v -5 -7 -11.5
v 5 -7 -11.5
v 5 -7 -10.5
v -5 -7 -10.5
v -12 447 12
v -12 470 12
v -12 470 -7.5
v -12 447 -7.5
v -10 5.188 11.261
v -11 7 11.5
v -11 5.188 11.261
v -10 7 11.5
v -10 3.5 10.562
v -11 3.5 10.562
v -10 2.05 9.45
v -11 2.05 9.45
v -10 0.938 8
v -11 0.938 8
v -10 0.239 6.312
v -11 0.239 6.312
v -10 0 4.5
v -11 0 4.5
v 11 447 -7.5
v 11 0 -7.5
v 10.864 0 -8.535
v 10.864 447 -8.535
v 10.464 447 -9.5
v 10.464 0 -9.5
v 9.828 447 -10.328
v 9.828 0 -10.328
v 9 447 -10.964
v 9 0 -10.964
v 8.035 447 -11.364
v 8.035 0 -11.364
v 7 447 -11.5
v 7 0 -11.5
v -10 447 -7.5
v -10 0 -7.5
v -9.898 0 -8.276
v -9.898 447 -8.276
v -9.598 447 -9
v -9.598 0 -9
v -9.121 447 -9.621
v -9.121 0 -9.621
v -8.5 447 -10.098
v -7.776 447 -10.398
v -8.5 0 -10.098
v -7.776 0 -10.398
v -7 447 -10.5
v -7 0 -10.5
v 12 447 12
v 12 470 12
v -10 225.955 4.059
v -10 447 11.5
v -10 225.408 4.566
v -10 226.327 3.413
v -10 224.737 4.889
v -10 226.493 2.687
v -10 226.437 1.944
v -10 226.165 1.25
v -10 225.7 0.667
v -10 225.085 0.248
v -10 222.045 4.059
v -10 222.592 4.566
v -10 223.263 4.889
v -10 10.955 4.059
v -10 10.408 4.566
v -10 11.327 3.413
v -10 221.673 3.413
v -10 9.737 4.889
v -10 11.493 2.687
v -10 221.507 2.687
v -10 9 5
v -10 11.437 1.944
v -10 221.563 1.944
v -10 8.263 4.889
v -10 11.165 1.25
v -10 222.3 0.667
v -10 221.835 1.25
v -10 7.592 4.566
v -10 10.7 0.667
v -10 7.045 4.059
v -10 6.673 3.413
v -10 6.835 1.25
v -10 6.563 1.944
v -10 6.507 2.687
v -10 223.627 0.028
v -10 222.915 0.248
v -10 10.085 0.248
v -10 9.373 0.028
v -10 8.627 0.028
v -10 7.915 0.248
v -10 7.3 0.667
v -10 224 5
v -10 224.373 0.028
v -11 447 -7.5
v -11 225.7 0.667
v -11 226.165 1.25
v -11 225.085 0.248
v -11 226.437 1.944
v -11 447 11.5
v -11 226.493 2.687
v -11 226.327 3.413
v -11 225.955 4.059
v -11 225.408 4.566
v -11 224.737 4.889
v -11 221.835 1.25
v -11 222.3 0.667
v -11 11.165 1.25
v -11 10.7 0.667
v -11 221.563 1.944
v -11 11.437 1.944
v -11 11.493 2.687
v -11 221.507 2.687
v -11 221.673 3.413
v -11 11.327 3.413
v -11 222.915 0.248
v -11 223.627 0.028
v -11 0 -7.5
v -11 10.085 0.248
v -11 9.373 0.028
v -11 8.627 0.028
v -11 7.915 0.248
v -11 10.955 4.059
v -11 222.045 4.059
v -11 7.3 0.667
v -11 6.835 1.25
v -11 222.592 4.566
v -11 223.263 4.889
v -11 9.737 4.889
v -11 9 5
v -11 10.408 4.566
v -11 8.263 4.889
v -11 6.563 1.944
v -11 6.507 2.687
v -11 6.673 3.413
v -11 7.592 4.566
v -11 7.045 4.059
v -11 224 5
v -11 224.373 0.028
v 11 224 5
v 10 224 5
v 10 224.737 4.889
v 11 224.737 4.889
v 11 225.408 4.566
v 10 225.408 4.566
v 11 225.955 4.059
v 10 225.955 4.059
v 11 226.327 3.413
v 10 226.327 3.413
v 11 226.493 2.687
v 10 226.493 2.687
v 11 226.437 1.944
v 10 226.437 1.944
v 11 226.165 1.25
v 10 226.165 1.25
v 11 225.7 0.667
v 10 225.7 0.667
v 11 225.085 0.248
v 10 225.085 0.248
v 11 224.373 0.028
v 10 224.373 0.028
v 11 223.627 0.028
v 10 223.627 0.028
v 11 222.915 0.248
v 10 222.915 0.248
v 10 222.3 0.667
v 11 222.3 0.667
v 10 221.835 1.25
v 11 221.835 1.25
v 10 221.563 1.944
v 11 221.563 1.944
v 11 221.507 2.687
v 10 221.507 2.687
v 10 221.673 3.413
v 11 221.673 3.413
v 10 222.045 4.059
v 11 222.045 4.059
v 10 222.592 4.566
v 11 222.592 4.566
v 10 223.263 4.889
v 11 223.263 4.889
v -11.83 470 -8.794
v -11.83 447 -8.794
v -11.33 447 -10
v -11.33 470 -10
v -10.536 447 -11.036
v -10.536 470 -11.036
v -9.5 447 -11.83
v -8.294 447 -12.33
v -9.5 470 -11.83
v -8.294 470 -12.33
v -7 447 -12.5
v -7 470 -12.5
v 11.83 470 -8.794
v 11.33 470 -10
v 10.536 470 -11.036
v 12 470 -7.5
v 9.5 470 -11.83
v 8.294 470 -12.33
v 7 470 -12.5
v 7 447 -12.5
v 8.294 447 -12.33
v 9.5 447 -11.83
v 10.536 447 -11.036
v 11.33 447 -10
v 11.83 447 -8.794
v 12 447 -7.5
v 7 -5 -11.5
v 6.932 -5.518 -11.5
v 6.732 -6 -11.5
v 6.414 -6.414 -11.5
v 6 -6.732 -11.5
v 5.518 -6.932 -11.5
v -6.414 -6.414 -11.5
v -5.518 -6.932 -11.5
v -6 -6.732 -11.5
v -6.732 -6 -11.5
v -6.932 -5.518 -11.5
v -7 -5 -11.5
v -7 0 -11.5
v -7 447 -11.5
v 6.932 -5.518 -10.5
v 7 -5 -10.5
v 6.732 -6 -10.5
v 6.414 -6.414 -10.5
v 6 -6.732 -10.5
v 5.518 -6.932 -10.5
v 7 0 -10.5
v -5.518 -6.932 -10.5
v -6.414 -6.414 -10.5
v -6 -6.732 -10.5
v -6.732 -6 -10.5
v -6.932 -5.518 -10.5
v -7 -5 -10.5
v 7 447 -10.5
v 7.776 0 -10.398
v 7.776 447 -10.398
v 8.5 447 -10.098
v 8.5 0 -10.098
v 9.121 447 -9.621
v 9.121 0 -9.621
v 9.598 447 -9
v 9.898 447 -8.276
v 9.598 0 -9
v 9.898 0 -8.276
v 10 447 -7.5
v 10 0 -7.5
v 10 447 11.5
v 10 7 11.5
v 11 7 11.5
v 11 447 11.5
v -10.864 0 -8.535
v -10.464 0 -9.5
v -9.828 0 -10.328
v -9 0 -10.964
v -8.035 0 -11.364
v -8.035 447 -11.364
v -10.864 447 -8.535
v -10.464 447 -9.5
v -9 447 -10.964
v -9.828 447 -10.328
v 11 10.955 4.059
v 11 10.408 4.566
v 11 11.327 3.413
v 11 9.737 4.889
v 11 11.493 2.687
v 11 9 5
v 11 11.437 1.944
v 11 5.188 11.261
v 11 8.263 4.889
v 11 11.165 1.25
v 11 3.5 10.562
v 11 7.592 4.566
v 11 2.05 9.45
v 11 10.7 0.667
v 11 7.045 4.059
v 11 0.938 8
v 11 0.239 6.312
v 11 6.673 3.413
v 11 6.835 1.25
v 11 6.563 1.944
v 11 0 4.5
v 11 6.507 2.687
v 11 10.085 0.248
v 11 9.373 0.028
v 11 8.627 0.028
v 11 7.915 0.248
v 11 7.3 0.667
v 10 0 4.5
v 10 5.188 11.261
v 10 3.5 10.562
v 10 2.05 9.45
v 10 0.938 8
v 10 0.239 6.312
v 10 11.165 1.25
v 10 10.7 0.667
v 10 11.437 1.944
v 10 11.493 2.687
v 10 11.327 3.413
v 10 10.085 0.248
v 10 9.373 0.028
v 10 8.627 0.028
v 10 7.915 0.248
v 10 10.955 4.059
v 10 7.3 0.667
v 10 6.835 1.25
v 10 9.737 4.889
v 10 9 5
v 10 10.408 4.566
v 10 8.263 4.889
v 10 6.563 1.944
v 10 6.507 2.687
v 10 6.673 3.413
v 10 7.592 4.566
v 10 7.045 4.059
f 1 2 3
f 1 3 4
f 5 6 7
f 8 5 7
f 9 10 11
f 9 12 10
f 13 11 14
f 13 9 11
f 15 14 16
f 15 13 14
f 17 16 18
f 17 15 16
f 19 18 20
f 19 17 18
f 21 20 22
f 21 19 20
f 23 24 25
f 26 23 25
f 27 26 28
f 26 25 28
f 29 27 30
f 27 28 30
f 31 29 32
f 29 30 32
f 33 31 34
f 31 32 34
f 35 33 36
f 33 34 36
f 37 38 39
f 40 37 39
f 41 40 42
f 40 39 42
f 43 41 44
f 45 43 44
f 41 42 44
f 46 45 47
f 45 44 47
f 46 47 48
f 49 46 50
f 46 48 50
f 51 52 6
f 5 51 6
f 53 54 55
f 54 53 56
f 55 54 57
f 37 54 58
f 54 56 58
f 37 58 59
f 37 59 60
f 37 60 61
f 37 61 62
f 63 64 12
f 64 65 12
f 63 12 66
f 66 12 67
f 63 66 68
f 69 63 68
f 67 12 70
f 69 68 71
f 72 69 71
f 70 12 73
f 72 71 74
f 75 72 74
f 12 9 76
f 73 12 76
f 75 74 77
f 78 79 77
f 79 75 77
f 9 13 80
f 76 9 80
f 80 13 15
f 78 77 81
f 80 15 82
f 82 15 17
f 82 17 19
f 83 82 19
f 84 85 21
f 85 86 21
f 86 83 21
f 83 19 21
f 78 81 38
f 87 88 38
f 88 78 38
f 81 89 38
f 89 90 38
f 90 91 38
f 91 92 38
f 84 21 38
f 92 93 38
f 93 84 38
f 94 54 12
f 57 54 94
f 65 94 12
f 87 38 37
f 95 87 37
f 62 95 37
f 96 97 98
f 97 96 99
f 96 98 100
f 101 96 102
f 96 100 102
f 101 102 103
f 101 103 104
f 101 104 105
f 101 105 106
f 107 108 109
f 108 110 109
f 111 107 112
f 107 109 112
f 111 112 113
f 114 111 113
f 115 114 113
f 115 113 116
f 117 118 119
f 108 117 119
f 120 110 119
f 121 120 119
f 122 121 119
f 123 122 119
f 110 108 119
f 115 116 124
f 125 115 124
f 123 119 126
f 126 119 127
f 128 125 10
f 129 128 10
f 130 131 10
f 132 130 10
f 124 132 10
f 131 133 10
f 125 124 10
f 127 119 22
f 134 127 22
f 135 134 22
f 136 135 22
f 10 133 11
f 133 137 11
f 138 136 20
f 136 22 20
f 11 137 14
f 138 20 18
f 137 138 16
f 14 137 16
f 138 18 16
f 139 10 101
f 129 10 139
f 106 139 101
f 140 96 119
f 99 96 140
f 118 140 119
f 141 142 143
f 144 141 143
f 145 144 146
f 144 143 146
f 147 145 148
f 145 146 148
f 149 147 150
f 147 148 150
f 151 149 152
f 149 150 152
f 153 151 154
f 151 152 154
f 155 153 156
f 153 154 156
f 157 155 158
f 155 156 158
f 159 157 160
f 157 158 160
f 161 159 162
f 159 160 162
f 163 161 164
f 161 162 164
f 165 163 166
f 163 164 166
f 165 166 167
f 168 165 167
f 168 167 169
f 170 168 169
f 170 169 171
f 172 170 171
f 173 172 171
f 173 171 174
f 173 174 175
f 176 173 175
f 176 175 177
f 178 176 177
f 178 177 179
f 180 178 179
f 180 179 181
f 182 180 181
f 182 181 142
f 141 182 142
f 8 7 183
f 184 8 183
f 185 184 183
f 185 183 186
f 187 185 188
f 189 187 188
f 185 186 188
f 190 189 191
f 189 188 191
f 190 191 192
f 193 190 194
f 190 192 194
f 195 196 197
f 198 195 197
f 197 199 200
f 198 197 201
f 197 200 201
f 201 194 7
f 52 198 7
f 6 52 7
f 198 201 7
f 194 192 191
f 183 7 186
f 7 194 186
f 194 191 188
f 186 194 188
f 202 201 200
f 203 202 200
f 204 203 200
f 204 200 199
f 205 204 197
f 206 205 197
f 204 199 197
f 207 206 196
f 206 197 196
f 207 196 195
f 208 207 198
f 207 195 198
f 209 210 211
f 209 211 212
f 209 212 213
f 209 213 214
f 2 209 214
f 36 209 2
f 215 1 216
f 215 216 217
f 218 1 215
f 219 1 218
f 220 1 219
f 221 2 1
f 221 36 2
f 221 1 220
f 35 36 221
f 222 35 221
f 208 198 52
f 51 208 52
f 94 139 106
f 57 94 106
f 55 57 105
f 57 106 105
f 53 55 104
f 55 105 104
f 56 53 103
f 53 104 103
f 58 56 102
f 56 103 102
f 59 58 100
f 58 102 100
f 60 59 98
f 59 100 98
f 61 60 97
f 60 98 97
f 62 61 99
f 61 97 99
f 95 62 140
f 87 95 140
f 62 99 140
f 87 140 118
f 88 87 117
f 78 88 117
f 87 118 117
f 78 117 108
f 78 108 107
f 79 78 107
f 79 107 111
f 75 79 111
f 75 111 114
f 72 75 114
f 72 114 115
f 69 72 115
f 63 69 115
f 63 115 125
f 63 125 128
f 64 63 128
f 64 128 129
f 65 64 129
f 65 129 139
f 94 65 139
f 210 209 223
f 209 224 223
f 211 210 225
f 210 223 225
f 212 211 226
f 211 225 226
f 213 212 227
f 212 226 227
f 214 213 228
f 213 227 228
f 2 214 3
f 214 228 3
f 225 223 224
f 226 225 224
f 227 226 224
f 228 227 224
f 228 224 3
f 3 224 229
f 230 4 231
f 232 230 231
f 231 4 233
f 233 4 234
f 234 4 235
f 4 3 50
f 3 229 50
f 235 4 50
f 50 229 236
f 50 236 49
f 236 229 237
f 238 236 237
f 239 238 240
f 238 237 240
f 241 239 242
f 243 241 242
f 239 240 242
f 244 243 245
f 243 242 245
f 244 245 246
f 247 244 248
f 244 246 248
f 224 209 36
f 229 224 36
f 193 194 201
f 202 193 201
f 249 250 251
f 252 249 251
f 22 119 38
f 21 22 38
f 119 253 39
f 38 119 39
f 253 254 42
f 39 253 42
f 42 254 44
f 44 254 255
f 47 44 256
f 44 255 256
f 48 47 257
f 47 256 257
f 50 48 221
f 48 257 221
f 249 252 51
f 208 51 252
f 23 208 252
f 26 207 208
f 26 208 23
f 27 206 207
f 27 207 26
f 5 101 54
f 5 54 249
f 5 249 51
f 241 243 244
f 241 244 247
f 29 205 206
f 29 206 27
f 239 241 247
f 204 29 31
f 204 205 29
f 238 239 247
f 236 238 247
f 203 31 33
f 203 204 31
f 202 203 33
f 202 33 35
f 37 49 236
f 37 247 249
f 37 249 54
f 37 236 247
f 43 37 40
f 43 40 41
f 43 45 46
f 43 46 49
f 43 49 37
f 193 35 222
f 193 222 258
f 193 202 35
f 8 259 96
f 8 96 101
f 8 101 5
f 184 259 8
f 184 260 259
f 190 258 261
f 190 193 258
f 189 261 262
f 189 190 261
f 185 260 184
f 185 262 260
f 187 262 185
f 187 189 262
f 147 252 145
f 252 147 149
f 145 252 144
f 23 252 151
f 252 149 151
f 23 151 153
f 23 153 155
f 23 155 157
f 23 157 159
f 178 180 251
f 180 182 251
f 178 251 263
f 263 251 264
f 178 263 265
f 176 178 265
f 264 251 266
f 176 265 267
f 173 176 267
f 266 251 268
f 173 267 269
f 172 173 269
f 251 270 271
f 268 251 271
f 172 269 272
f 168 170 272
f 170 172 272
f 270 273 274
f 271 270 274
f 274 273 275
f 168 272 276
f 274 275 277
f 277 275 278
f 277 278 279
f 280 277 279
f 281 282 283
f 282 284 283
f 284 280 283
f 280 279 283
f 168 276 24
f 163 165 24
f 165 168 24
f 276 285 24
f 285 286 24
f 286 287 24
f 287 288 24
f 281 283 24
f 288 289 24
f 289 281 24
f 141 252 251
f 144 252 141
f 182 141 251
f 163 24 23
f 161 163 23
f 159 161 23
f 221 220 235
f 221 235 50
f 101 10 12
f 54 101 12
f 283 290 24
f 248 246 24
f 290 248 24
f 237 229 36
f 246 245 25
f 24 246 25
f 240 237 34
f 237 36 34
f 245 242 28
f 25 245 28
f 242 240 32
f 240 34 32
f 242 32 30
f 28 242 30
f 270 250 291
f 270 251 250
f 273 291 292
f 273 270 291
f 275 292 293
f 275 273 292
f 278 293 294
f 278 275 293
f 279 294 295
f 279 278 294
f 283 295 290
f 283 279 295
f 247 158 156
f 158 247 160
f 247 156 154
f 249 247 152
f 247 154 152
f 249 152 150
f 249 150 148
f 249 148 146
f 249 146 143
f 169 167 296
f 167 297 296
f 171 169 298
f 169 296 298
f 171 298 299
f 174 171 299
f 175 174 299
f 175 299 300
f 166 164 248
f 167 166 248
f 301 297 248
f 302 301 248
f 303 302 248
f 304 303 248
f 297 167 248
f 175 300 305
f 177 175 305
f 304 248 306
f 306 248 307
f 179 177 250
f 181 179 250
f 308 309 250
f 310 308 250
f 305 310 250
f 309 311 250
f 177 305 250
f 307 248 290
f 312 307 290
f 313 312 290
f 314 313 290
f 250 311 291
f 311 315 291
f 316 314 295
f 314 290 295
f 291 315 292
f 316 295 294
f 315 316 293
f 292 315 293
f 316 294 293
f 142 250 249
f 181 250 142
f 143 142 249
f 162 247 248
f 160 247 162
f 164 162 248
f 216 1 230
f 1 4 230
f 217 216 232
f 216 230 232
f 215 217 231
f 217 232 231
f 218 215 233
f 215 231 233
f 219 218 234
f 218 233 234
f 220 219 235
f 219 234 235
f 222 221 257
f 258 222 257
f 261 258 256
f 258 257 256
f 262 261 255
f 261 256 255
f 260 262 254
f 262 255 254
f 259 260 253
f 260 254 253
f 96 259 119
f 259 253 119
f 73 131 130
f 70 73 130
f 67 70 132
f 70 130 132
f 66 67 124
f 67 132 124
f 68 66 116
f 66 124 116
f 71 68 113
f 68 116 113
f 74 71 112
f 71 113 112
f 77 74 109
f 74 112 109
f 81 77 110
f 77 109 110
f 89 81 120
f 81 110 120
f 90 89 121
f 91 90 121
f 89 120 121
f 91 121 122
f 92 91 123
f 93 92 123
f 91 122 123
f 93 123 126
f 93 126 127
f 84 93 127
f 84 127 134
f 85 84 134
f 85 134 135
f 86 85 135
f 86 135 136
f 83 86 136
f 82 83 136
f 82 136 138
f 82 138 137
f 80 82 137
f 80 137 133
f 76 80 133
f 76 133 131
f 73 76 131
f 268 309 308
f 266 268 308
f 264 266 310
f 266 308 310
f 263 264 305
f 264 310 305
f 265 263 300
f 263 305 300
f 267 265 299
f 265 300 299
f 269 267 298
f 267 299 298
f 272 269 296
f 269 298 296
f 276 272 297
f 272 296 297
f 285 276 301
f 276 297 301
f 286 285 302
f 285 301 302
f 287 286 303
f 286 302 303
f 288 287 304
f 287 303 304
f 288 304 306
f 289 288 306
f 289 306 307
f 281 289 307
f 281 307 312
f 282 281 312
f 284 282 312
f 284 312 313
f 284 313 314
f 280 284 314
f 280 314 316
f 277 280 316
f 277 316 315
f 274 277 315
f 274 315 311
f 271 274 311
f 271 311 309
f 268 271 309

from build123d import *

# Parameters (mm, degrees)
EXTRUDE_1_DEPTH     = 470
FILLET_1_R          = 7
EXTRUDE_1_2_DEPTH   = 23
SKETCH_5_W          = 14
SKETCH_5_H          = 7
EXTRUDE_2_DEPTH     = 1
FILLET_2_R          = 2
SKETCH_3_R          = 2.5
CUT_EXTRUDE_1_DEPTH = 471.728424891


with BuildPart() as part:
    # Эскиз1 → Extrude 1 (new body)
    with BuildSketch(Plane(origin=(0, 0, 0), x_dir=(1, 0, 0), z_dir=(0, 1, 0))):
        with BuildLine():
            Line((11, -11.5), (11, 7.5))
            ThreePointArc((11, 7.5), (9.828427125, 10.328427125), (7, 11.5))
            Line((7, 11.5), (-7, 11.5))
            ThreePointArc((-7, 11.5), (-9.828427125, 10.328427125), (-11, 7.5))
            Line((-11, 7.5), (-11, -11.5))
            Line((-11, -11.5), (-10, -11.5))
            Line((-10, -11.5), (-10, 7.5))
            ThreePointArc((-10, 7.5), (-9.121320344, 9.621320344), (-7, 10.5))
            Line((-7, 10.5), (7, 10.5))
            ThreePointArc((7, 10.5), (9.121320344, 9.621320344), (10, 7.5))
            Line((10, 7.5), (10, -11.5))
            Line((10, -11.5), (11, -11.5))
        make_face()
    extrude(amount=EXTRUDE_1_DEPTH)

    # Скругление1
    fillet_1_edges = [part.edges().sort_by_distance(p)[0] for p in [
        (-10.5, 0, 11.5),
        (10.5, 0, 11.5),
    ]]
    fillet(fillet_1_edges, radius=FILLET_1_R)

    # Эскиз2 → Extrude 1 2 (add)
    with BuildSketch(Plane(origin=(0, 470, 0), x_dir=(1, 0, 0), z_dir=(0, 1, 0))):
        with BuildLine():
            Line((-12, -11.5), (-12, 7.5))
            ThreePointArc((-12, 7.5), (-10.535533906, 11.035533906), (-7, 12.5))
            Line((-7, 12.5), (7, 12.5))
            ThreePointArc((7, 12.5), (10.535533906, 11.035533906), (12, 7.5))
            Line((12, 7.5), (12, -11.5))
            Line((12, -11.5), (12, -12))
            Line((12, -12), (-12, -12))
            Line((-12, -12), (-12, -11.5))
        make_face()
    extrude(amount=-EXTRUDE_1_2_DEPTH)

    # Эскиз5 → Бобышка-Вытянуть2 (add)
    with BuildSketch(Plane(origin=(0, 0, -11.5), x_dir=(-1, 0, 0), z_dir=(0, 0, -1))):
        with Locations((0, -3.5)):
            Rectangle(SKETCH_5_W, SKETCH_5_H)
    extrude(amount=-EXTRUDE_2_DEPTH)

    # Скругление2
    fillet_2_edges = [part.edges().sort_by_distance(p)[0] for p in [
        (7, -7, -11),
        (-7, -7, -11),
    ]]
    fillet(fillet_2_edges, radius=FILLET_2_R)

    # Эскиз3 → Вырез-Вытянуть1 (cut, through all)
    with BuildSketch(Plane.ZY.offset(11)):
        with Locations((2.5, 9)):
            Circle(SKETCH_3_R)
        with Locations((2.5, 224)):
            Circle(SKETCH_3_R)
    extrude(amount=-CUT_EXTRUDE_1_DEPTH, mode=Mode.SUBTRACT)


solid = part.part
